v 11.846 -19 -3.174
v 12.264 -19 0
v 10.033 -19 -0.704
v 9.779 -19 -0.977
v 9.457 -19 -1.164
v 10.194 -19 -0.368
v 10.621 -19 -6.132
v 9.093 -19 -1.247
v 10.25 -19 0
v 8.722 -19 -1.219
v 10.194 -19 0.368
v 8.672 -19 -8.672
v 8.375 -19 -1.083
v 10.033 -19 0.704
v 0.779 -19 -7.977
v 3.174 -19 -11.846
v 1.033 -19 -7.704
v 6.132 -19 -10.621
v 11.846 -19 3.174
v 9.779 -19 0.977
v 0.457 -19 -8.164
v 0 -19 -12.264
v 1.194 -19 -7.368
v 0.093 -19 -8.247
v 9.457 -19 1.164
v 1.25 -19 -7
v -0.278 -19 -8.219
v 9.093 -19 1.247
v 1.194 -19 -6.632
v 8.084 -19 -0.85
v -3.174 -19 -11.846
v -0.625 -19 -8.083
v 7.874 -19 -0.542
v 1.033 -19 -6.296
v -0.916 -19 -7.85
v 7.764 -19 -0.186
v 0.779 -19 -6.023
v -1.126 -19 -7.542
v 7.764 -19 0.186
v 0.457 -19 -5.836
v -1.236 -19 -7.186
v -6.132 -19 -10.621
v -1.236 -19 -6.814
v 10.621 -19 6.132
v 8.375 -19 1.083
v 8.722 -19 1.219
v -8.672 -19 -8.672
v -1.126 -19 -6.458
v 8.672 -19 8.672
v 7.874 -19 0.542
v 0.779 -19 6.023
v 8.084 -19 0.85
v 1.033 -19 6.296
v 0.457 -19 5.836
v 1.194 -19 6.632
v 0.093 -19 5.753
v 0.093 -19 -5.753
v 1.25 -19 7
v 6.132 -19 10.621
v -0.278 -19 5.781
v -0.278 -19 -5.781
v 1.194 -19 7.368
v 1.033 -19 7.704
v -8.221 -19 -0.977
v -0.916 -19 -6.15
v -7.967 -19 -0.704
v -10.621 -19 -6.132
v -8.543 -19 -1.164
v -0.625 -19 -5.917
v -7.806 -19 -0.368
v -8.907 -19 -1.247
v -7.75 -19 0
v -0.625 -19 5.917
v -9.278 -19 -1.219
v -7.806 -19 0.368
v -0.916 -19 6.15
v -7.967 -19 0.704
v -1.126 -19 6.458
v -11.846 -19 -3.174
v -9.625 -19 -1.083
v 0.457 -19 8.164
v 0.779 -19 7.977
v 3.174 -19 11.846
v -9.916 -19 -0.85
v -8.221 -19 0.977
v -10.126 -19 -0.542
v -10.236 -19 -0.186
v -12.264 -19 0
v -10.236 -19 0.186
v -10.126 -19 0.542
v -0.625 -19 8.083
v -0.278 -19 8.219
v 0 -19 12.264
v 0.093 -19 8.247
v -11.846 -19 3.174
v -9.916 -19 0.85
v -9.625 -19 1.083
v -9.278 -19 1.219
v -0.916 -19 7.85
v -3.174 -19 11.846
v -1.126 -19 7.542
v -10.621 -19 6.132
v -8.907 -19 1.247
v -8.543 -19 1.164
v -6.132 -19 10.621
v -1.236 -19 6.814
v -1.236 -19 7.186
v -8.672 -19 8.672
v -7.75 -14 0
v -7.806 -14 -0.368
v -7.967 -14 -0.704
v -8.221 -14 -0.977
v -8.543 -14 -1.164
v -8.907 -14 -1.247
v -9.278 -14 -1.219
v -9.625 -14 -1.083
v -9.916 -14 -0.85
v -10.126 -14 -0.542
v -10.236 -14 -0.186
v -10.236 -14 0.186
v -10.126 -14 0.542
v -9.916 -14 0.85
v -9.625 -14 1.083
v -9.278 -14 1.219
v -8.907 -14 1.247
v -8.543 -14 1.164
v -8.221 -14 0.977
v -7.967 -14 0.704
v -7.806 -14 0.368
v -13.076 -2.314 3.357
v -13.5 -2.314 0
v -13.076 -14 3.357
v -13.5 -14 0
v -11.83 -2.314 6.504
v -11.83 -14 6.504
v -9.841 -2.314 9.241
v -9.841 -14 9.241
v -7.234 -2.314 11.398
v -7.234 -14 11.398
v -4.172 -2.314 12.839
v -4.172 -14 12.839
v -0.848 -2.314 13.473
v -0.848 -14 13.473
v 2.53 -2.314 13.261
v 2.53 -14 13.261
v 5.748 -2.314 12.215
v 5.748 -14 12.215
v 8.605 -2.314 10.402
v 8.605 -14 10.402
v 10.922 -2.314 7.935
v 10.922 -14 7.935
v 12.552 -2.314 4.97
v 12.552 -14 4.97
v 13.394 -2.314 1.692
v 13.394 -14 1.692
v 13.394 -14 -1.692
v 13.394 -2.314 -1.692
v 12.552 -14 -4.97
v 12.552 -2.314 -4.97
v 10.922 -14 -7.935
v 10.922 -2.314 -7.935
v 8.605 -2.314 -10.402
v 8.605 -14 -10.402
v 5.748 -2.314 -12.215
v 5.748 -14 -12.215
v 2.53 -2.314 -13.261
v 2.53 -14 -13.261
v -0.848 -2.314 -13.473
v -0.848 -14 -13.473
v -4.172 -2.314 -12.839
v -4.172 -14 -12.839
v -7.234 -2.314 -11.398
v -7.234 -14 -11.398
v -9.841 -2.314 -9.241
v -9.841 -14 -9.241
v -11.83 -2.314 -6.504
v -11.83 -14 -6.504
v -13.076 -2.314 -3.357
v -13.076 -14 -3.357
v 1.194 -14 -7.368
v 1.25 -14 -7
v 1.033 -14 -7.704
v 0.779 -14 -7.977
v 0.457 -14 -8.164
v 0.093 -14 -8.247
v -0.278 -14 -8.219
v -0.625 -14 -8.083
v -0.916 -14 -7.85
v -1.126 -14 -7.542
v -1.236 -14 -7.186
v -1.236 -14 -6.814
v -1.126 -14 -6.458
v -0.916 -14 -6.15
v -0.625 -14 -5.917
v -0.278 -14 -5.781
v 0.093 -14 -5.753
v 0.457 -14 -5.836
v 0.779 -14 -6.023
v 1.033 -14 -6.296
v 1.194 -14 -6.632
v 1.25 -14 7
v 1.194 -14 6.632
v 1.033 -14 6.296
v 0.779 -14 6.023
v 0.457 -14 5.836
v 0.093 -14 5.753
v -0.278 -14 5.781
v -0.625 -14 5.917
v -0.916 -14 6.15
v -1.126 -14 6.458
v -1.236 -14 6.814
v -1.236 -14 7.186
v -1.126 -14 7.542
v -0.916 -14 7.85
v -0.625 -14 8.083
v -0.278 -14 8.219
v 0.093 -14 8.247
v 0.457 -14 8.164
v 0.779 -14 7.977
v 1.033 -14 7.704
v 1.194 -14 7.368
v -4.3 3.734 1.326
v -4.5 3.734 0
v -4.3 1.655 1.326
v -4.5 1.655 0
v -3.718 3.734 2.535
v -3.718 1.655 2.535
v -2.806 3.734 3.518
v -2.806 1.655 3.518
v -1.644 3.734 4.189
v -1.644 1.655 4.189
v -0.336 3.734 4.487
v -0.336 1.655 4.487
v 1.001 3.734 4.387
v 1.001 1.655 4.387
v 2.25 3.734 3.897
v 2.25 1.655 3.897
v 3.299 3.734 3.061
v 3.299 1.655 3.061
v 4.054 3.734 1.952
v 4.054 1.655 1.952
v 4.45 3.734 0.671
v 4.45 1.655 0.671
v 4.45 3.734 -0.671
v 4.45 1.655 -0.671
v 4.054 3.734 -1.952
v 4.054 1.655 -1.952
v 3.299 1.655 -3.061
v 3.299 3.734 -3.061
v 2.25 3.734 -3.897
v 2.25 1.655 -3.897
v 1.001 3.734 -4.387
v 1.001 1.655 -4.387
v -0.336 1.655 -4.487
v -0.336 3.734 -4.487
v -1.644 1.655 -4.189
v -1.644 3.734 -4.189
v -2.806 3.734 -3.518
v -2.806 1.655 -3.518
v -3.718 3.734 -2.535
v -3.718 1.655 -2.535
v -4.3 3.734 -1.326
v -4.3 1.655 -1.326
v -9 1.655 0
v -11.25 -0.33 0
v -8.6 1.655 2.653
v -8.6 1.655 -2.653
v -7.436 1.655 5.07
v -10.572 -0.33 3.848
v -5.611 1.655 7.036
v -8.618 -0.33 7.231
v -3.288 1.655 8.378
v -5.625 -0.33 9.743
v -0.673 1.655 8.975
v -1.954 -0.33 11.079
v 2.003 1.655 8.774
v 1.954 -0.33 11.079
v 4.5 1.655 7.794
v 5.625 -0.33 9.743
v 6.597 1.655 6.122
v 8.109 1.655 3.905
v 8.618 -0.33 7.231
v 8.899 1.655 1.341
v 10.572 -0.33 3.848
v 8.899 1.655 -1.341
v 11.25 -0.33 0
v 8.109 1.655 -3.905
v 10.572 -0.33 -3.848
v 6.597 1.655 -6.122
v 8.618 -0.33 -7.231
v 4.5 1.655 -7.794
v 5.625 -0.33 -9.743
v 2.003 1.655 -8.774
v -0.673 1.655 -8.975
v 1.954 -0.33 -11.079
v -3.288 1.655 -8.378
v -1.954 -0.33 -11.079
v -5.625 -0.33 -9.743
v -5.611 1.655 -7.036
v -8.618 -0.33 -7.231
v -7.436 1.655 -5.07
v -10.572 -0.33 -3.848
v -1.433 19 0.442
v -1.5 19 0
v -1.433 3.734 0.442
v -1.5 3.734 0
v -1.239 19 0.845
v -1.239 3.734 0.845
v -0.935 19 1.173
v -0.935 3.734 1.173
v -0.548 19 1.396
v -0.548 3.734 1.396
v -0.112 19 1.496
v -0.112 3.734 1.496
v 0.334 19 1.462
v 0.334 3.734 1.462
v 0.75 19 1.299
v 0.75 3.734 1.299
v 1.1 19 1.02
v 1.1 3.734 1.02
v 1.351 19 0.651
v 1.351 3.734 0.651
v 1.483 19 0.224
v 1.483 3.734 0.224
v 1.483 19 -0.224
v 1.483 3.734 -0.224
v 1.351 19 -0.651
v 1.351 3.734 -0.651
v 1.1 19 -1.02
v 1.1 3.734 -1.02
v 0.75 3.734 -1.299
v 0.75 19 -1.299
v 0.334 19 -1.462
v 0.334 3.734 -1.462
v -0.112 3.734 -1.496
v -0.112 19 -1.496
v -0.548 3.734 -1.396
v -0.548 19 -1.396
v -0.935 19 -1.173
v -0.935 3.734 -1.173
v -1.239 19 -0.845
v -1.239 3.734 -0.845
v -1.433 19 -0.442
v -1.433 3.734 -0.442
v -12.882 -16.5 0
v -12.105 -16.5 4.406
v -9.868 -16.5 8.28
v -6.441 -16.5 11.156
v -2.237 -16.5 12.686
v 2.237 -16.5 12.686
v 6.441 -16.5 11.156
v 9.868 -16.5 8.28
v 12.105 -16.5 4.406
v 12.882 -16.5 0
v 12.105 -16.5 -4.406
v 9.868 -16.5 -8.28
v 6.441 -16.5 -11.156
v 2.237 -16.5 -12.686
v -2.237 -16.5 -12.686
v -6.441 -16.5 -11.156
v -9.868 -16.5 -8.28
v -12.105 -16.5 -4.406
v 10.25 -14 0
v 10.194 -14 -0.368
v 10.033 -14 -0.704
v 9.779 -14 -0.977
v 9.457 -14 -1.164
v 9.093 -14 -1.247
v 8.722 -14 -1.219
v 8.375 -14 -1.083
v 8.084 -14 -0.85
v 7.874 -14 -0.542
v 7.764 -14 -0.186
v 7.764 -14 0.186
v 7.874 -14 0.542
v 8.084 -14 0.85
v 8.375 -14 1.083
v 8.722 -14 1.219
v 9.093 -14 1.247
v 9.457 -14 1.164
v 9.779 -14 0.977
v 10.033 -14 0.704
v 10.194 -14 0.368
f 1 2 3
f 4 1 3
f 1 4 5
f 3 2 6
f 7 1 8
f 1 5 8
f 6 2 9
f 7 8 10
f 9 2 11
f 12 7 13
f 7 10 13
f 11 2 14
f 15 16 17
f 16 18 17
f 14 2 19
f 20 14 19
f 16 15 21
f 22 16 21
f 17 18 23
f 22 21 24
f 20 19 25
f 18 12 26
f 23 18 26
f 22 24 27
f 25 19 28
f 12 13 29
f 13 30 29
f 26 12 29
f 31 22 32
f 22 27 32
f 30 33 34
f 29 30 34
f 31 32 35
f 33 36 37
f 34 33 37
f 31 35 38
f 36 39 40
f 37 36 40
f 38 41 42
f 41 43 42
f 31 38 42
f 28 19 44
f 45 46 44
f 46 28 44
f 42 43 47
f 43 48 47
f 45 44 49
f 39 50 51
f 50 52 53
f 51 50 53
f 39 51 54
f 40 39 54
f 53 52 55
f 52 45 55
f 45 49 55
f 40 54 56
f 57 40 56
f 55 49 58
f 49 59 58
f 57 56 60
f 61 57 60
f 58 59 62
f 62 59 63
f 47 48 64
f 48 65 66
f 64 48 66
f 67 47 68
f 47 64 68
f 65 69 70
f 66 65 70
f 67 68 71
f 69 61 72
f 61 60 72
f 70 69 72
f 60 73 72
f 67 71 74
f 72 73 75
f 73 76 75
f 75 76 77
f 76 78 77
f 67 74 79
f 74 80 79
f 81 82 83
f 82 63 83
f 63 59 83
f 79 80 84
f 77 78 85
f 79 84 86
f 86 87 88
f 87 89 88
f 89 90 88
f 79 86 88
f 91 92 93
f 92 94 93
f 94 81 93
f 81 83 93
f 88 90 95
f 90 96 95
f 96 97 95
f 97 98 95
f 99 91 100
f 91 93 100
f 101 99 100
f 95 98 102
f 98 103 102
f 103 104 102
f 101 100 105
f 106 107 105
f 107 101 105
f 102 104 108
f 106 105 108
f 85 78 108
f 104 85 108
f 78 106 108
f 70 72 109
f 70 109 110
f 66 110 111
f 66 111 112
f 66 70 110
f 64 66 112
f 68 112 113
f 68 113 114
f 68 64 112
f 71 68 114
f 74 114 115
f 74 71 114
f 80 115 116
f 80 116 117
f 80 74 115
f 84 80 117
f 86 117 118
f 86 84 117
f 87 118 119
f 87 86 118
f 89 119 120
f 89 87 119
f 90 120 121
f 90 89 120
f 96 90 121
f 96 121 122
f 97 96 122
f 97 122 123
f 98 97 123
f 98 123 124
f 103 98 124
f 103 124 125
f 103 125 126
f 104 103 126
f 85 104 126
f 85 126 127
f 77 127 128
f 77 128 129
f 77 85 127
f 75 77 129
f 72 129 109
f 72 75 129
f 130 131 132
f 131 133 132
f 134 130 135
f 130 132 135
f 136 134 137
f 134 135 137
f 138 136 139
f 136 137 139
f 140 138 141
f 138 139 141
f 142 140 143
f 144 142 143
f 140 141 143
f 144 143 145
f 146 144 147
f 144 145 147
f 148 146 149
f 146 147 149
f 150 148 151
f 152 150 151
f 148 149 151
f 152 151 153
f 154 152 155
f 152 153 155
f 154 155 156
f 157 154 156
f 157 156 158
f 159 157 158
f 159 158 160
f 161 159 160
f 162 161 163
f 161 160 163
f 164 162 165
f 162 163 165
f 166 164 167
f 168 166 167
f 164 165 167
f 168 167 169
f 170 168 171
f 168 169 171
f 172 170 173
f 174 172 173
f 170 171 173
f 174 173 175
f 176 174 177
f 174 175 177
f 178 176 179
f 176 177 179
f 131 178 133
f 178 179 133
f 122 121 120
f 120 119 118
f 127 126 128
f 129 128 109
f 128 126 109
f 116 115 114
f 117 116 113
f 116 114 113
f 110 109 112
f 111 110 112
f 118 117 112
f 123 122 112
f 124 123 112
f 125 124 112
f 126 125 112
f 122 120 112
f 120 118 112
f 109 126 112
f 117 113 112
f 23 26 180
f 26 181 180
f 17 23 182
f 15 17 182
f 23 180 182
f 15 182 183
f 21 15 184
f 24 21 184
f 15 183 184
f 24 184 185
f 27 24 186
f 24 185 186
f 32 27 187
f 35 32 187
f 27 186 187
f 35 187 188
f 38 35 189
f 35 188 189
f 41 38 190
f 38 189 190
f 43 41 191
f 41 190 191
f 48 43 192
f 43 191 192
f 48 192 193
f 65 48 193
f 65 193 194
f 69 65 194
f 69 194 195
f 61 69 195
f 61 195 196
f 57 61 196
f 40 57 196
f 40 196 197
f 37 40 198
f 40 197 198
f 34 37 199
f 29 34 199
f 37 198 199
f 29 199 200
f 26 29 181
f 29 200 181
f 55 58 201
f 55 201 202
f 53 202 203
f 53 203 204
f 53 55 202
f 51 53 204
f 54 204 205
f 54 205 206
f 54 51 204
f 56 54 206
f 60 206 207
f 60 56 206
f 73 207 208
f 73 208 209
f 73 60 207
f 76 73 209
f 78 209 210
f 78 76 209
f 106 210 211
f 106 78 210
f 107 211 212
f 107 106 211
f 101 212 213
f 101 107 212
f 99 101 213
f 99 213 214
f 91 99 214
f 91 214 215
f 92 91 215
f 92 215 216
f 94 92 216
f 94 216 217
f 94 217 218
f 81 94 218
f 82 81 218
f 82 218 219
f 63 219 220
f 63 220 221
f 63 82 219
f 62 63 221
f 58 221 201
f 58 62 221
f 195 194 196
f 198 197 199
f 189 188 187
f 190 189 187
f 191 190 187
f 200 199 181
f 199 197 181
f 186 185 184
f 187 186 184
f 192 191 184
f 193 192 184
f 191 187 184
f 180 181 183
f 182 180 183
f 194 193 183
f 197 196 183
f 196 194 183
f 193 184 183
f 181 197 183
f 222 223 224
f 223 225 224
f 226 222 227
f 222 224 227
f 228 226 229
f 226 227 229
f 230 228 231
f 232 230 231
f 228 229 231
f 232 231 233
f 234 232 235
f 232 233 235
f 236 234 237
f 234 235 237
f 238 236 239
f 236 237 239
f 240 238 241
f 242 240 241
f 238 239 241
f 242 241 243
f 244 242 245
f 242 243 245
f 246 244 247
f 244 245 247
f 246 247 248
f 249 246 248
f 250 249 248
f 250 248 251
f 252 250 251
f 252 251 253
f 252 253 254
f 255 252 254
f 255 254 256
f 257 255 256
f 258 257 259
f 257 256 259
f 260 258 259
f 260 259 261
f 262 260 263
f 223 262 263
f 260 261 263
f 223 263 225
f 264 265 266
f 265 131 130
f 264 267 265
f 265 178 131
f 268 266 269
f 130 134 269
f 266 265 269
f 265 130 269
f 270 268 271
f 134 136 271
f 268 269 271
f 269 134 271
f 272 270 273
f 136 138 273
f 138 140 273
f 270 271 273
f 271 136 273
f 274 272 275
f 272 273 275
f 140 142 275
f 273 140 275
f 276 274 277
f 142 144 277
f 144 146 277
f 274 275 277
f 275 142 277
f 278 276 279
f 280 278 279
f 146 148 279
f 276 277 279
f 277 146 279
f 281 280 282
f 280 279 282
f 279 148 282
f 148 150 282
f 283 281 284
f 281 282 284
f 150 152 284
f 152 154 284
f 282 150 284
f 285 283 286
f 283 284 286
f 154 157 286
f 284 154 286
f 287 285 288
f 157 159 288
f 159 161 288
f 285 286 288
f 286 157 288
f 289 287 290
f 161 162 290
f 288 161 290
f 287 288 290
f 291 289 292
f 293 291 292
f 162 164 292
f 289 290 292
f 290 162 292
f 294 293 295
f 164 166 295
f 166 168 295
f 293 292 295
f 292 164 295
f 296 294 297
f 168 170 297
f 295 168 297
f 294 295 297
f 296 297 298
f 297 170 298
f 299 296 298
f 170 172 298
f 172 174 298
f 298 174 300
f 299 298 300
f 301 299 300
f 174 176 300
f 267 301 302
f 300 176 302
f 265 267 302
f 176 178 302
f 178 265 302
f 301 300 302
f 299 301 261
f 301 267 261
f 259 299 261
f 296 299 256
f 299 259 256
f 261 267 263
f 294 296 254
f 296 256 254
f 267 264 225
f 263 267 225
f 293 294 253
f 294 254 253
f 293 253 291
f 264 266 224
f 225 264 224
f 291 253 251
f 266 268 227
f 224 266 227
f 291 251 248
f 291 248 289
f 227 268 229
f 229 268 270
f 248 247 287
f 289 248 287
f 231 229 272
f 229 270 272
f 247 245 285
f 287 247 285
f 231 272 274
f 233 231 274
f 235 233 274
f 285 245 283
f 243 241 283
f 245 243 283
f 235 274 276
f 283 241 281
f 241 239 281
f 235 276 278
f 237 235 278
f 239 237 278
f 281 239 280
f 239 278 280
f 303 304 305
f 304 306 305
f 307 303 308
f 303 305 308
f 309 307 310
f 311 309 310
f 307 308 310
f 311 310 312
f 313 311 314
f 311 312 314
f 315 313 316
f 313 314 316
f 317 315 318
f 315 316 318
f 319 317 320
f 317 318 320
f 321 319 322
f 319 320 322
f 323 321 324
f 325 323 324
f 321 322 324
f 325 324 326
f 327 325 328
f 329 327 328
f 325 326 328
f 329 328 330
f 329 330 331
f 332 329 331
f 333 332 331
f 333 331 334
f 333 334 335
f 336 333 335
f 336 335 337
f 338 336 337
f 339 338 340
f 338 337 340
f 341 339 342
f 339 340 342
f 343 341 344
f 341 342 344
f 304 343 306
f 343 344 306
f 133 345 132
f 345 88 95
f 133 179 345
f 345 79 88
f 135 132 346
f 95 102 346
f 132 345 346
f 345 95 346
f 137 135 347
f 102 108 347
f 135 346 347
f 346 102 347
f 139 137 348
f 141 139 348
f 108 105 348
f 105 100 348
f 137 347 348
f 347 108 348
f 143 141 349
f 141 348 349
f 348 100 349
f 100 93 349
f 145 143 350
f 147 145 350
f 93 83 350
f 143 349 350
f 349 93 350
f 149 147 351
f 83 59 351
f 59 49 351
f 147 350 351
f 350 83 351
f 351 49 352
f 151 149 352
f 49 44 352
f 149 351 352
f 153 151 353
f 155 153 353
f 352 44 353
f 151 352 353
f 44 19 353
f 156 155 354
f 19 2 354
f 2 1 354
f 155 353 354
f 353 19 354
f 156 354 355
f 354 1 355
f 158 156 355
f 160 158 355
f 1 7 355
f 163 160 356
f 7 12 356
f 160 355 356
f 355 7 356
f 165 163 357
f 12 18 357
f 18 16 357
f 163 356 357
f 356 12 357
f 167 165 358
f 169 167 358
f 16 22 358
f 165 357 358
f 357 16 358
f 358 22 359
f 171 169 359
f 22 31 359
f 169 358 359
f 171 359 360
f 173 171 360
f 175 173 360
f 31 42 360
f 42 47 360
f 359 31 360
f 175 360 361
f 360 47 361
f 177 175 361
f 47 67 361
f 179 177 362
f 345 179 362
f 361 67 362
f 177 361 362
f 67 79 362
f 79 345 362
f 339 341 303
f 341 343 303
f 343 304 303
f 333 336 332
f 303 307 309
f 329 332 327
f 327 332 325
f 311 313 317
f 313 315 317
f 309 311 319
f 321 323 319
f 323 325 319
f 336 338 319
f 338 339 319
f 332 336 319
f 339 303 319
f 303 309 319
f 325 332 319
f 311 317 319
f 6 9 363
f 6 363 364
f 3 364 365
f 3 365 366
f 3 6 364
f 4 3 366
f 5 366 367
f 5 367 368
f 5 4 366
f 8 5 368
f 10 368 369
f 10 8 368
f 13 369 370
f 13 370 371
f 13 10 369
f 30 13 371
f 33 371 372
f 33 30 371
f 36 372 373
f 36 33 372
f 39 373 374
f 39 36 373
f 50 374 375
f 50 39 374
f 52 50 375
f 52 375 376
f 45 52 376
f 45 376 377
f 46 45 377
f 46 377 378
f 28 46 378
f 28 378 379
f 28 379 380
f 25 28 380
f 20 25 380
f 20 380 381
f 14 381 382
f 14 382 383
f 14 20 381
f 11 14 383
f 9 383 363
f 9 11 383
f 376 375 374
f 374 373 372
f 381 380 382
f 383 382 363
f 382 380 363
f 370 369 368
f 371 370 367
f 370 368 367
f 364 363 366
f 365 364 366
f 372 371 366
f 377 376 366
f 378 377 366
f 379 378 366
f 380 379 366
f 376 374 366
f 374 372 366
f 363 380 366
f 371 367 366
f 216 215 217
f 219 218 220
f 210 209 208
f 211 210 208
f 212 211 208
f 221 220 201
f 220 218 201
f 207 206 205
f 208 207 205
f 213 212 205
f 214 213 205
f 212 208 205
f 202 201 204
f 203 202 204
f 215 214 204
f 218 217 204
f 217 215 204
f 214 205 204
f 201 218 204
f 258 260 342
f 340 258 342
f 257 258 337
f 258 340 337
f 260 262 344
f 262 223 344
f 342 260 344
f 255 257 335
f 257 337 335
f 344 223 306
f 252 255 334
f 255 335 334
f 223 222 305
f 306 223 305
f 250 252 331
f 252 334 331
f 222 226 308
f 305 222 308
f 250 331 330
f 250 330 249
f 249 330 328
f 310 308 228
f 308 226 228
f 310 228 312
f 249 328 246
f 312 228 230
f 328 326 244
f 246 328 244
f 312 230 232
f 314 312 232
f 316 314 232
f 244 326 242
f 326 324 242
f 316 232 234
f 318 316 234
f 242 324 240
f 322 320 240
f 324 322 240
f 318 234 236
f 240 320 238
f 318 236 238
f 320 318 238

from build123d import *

# Parameters (mm, degrees)
CROQUIS3_R            = 1.25
CORTAR_EXTRUIR1_DEPTH = 5


with BuildPart() as part:
    # Croquis2 → Revolución1 (revolve)
    with BuildSketch(Plane.XY):
        Polygon((0, 19), (-1.5, 19), (-1.5, 3.734066961), (-4.5, 3.734066961), (-4.5, 1.654780276), (-9, 1.654780276), (-13.5, -2.31384669), (-13.5, -14), (-12.264104671, -19), (0, -19), align=None)
    revolve(axis=Axis((0, -19, 0), (0, 1, 0)))

    # Croquis3 → Cortar-Extruir1 (cut, symmetric)
    with BuildSketch(Plane(origin=(0, -19, 0), x_dir=(1, 0, 0), z_dir=(0, 1, 0))):
        with Locations((-9, 0)):
            Circle(CROQUIS3_R)
        with Locations((9, 0)):
            Circle(CROQUIS3_R)
        with Locations((0, -7)):
            Circle(CROQUIS3_R)
        with Locations((0, 7)):
            Circle(CROQUIS3_R)
    extrude(amount=CORTAR_EXTRUIR1_DEPTH, both=True, mode=Mode.SUBTRACT)


solid = part.part
